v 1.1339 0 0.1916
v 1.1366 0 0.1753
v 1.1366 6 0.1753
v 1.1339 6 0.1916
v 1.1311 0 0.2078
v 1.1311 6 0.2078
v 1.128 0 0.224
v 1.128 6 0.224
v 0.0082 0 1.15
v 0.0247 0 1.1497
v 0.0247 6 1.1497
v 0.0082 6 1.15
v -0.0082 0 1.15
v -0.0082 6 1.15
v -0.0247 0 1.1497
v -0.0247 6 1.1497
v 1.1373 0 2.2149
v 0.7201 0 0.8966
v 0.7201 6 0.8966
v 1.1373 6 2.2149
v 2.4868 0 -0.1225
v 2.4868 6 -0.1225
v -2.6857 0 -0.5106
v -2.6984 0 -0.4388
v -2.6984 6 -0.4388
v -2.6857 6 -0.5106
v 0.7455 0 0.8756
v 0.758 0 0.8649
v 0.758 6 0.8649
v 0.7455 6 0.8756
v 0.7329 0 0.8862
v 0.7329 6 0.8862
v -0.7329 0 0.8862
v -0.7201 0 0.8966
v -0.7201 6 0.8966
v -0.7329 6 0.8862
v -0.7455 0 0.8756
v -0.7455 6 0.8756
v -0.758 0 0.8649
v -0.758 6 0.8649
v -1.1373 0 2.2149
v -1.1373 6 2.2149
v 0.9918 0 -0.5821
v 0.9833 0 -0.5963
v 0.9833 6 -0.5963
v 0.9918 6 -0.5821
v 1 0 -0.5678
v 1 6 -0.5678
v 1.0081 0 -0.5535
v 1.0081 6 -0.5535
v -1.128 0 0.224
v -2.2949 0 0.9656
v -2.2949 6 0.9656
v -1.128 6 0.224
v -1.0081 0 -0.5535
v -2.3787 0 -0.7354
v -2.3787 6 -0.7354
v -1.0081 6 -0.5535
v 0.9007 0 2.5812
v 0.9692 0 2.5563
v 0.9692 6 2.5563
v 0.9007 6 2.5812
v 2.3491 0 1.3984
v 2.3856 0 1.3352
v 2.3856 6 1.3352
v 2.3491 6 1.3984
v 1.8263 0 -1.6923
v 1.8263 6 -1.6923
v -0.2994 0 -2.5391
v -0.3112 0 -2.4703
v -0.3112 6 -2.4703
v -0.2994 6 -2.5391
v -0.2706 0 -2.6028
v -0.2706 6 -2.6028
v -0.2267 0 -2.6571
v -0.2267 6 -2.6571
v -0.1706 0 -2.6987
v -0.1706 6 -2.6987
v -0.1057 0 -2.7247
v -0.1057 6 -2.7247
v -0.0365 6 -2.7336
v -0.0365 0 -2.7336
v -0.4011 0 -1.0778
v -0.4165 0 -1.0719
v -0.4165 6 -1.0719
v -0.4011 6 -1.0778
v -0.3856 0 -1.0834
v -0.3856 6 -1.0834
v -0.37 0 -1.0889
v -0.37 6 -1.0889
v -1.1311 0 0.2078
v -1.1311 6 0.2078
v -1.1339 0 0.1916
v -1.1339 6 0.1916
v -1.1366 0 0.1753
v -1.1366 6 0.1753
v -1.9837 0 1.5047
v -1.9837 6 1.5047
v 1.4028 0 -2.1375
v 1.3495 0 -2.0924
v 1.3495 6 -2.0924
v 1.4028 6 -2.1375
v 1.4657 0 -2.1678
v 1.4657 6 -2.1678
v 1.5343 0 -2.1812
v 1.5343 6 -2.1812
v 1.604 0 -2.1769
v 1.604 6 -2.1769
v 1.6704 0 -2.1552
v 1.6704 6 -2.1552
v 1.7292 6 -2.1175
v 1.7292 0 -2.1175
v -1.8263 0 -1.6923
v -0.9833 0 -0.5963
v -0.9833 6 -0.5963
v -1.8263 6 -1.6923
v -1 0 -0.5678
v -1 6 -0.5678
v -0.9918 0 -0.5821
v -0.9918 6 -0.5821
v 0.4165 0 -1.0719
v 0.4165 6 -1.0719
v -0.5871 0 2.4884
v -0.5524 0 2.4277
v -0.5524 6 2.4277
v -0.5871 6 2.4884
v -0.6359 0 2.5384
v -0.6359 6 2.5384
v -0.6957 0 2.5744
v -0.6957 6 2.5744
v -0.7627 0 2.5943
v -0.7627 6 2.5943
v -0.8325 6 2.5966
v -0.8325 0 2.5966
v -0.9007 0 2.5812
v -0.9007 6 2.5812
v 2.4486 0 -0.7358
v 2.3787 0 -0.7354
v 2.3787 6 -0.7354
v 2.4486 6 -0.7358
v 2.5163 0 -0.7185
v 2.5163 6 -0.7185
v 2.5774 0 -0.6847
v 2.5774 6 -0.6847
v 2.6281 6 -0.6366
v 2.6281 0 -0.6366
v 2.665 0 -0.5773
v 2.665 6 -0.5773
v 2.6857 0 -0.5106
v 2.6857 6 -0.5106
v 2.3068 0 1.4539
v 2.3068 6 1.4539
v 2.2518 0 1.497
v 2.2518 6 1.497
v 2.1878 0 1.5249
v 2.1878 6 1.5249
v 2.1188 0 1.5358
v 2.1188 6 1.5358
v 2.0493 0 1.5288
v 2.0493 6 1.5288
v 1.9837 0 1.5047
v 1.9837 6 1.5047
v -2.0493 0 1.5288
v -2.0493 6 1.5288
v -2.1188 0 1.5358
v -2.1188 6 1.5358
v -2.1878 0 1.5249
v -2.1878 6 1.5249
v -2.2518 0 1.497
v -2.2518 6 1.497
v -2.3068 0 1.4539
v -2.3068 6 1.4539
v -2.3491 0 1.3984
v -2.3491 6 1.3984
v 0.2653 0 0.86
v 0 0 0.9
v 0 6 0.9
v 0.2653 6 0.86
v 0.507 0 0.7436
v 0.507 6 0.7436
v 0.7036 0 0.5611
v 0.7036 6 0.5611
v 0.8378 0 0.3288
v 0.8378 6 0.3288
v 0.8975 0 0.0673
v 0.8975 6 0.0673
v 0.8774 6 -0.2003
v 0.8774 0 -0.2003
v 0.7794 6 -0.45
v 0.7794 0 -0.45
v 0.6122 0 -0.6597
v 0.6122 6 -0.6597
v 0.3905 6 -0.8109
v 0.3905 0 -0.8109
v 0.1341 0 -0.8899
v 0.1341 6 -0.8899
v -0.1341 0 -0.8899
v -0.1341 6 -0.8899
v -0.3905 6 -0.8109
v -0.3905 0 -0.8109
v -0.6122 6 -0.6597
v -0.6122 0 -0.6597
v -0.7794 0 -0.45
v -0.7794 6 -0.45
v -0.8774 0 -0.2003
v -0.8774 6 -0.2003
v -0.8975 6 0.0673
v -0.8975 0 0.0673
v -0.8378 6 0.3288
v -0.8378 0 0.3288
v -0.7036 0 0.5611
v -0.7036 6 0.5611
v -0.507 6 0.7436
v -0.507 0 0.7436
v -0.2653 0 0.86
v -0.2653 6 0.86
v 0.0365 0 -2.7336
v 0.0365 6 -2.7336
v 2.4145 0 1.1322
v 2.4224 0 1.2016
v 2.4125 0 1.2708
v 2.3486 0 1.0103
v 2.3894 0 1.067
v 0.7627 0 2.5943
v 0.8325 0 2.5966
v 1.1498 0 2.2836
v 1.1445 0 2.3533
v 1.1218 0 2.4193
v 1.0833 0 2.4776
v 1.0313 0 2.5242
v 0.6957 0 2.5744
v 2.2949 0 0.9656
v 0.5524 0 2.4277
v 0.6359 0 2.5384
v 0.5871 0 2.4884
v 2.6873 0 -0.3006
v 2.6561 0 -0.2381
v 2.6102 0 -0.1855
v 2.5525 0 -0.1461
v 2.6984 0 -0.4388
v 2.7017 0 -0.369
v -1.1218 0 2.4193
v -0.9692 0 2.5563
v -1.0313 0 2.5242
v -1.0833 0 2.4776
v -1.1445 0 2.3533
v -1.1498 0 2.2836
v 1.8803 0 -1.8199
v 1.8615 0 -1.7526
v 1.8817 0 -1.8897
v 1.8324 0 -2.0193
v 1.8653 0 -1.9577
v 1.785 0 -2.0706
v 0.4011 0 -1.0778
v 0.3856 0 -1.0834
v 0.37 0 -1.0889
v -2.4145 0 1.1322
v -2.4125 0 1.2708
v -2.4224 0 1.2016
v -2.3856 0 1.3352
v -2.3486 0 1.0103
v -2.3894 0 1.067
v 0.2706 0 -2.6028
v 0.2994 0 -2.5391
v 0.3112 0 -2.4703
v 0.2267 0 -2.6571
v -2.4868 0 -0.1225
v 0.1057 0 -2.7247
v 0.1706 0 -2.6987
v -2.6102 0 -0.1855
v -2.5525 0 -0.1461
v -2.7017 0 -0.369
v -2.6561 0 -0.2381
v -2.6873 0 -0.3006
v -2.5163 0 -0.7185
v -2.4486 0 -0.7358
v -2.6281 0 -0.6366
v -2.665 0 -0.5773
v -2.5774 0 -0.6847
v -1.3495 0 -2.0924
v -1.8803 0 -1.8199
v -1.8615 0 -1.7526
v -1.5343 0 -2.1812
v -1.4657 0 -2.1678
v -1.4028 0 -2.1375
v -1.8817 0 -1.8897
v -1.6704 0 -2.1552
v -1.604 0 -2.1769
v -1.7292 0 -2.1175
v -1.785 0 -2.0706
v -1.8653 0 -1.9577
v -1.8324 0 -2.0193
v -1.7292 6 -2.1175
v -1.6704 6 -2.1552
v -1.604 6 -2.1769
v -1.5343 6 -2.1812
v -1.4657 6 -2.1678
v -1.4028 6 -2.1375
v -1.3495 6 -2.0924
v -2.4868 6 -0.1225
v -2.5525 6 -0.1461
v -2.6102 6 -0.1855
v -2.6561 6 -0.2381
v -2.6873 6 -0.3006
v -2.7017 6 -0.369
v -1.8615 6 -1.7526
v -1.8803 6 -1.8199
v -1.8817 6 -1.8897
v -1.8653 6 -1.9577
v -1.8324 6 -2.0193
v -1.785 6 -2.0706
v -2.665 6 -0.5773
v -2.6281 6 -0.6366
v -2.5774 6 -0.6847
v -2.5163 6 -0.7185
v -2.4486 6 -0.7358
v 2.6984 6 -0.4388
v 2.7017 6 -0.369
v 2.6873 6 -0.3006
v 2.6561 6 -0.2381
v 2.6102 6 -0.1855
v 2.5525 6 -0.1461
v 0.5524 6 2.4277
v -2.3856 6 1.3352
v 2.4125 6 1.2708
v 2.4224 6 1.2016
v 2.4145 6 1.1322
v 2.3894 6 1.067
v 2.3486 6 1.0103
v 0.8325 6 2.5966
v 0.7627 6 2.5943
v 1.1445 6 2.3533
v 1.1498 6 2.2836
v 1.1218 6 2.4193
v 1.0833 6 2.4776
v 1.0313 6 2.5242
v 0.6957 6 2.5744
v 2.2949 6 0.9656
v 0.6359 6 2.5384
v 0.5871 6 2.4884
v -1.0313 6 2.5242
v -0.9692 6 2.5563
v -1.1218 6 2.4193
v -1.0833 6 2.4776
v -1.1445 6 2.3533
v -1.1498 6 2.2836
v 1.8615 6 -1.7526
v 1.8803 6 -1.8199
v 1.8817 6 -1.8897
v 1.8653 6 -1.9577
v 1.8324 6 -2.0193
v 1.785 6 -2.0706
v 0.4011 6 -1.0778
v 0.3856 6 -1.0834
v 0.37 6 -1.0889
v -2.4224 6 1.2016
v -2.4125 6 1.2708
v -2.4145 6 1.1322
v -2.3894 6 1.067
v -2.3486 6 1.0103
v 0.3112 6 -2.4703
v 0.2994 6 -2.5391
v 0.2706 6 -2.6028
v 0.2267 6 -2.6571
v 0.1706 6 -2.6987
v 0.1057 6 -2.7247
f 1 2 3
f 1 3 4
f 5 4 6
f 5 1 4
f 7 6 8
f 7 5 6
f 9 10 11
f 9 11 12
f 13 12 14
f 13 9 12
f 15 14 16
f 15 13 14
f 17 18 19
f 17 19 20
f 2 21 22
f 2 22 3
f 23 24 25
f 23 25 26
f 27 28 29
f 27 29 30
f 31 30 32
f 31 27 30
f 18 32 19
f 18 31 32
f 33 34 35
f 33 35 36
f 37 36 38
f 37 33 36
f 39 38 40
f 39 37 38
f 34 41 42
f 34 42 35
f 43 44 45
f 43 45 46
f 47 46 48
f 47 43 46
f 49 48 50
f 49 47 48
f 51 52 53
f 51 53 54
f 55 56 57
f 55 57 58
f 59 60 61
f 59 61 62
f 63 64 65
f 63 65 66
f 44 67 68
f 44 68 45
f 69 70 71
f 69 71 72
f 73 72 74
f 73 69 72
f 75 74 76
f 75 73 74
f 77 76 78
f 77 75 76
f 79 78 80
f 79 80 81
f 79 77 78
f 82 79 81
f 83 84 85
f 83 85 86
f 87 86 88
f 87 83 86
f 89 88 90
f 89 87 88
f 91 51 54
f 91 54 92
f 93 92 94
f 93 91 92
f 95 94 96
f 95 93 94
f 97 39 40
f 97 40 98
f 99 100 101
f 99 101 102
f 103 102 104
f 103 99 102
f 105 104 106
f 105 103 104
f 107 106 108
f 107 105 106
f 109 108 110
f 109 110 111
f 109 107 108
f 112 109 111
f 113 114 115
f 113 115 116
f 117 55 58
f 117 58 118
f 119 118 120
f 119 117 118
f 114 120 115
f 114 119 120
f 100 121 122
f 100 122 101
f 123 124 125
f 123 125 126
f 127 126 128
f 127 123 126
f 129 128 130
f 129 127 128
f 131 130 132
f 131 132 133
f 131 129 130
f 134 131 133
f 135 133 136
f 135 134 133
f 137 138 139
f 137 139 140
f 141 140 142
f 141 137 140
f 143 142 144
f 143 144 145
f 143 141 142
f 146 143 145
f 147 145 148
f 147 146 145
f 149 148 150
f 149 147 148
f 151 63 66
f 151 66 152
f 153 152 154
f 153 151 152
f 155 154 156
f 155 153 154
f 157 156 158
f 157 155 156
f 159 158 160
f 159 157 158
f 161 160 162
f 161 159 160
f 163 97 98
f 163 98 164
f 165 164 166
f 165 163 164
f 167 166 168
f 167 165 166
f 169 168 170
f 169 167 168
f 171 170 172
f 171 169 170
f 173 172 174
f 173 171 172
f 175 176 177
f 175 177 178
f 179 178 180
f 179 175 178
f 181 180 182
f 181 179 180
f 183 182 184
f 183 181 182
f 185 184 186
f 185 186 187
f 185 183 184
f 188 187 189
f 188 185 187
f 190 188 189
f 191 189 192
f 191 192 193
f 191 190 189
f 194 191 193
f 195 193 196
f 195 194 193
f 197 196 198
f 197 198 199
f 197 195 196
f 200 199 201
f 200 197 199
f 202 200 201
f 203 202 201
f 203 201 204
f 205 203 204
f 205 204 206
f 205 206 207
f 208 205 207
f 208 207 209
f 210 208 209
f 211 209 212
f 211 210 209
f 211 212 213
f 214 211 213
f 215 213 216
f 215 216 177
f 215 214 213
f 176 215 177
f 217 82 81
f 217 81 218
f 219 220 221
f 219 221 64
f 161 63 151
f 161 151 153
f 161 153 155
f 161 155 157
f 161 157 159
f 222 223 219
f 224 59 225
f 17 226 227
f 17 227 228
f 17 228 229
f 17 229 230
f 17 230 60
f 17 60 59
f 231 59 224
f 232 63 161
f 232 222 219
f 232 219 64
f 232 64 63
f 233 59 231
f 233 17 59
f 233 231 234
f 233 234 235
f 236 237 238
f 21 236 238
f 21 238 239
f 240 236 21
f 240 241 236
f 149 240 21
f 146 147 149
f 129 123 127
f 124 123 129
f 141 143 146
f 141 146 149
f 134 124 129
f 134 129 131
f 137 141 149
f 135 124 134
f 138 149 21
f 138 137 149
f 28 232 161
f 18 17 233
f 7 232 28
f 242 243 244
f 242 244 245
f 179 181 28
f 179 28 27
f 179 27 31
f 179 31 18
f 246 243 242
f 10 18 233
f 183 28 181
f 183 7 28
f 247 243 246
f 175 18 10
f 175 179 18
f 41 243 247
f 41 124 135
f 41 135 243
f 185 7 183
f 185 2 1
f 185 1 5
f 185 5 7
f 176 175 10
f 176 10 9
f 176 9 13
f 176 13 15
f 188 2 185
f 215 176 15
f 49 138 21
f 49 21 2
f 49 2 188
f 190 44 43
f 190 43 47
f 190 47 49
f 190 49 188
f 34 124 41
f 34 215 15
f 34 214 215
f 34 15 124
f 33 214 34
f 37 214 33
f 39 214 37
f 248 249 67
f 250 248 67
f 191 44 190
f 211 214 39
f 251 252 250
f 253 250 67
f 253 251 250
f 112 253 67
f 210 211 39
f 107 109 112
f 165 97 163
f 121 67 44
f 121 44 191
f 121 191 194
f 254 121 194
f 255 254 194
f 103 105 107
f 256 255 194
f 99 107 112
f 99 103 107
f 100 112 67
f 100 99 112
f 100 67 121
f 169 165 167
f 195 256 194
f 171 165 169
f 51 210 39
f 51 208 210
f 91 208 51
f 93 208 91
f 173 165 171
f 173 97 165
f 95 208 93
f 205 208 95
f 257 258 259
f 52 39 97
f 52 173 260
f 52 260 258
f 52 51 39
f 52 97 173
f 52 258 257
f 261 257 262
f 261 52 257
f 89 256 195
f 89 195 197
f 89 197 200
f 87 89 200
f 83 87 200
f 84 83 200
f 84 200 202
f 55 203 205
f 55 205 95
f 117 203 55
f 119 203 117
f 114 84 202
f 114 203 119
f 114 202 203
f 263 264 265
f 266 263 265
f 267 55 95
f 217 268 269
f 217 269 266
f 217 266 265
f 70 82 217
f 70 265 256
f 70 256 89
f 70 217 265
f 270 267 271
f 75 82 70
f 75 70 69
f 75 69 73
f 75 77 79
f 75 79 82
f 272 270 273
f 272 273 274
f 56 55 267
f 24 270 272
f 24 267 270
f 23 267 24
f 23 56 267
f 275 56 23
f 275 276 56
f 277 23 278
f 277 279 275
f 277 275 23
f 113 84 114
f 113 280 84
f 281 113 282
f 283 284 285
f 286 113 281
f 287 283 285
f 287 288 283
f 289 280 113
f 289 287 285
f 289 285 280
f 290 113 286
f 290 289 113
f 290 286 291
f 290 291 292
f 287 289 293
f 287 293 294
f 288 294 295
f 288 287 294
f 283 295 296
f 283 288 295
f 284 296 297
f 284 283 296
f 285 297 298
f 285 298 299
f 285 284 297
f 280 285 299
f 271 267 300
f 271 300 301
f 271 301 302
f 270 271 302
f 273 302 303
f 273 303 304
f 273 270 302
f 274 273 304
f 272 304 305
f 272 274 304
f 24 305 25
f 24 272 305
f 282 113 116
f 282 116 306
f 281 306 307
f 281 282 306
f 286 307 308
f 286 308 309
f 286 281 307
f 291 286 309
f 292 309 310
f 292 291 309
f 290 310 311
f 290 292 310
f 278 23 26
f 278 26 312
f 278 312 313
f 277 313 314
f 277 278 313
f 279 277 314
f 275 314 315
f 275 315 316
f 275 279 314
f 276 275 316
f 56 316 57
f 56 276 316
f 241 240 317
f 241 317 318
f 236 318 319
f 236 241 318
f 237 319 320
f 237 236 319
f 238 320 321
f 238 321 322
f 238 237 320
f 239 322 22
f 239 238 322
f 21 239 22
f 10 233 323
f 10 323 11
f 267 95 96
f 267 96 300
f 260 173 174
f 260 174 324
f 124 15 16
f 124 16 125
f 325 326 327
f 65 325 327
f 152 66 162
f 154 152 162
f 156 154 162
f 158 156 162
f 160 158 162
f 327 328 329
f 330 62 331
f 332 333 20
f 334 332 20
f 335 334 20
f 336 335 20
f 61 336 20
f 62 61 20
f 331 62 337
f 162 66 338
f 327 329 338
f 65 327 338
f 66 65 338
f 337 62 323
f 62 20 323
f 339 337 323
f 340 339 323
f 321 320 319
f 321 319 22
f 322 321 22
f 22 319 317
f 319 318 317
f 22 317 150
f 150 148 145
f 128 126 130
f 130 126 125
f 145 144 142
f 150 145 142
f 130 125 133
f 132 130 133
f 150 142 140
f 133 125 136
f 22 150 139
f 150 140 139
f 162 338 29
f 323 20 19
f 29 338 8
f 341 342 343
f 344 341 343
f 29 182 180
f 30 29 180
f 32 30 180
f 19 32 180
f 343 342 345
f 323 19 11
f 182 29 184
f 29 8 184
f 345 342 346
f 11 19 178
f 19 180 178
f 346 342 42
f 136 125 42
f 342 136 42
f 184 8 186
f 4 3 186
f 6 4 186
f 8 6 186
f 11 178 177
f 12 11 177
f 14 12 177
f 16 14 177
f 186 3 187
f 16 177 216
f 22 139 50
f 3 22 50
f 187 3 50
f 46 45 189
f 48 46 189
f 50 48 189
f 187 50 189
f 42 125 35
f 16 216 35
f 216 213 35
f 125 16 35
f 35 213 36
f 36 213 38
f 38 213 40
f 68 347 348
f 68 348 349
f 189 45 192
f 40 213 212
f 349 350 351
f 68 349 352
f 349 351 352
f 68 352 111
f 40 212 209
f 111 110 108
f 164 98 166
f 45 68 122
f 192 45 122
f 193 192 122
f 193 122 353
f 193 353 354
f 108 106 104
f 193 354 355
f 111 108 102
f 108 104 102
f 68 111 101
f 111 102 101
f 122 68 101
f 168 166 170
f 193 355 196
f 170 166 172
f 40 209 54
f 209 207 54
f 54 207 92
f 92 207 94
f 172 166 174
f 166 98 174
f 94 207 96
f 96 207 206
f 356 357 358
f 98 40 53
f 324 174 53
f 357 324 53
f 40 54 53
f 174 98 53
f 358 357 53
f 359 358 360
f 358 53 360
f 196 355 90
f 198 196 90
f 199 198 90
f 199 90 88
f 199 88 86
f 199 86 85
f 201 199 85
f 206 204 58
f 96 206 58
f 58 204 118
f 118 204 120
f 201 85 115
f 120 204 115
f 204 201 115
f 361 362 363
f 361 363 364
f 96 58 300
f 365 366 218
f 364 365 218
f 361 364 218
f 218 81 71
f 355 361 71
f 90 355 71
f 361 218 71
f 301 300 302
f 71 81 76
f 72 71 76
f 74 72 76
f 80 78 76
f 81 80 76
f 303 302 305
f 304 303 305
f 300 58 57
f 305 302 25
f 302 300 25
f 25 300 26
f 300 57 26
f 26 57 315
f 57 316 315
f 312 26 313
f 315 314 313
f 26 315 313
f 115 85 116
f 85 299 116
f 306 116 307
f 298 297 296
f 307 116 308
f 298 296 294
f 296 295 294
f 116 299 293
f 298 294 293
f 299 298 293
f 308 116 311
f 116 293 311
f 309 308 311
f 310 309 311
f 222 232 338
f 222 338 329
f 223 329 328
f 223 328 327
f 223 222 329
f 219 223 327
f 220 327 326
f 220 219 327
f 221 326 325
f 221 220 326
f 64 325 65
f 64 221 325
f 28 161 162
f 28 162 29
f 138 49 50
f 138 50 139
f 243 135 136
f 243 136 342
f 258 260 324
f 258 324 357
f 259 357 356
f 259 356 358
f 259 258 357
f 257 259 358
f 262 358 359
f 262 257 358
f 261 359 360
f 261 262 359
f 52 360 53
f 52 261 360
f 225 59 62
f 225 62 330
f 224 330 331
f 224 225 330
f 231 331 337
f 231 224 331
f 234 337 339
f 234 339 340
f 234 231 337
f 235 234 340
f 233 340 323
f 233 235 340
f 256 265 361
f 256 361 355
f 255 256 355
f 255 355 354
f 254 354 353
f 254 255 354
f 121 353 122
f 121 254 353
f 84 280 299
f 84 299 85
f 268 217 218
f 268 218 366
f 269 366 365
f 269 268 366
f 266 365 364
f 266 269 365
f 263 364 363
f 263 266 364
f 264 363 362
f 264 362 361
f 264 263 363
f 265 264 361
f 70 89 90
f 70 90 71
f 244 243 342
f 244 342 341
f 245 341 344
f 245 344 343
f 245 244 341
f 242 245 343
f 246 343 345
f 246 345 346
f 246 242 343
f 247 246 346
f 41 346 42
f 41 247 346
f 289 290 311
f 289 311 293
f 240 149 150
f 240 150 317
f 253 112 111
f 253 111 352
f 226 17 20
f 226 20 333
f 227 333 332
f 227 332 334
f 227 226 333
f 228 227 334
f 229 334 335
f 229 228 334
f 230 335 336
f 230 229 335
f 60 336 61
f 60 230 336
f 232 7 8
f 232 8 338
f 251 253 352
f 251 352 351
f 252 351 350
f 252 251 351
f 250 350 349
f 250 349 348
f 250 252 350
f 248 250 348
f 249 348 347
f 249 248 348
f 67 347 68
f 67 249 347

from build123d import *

# Parameters (mm, degrees)
ESBO_O1_R                = 0.9
RESSALTO_EXTRUS_O1_DEPTH = 6


with BuildPart() as part:
    # Esboço1 → Ressalto-extrusão1 (new body)
    with BuildSketch(Plane(origin=(0, 0, 0), x_dir=(1, 0, 0), z_dir=(0, 1, 0))):
        with BuildLine():
            Line((0.036455066, 2.733587387), (-0.036455066, 2.733587387))
            ThreePointArc((-0.036455066, 2.733587387), (-0.22673027, 2.657132964), (-0.311206342, 2.470280816))
            Line((-0.311206342, 2.470280816), (-0.37, 1.088852607))
            ThreePointArc((-0.37, 1.088852607), (-0.393323165, 1.080646514), (-0.416464521, 1.071940905))
            Line((-0.416464521, 1.071940905), (-1.349468012, 2.092384472))
            ThreePointArc((-1.349468012, 2.092384472), (-1.534286683, 2.181221351), (-1.729189902, 2.117482292))
            Line((-1.729189902, 2.117482292), (-1.785042303, 2.070616563))
            ThreePointArc((-1.785042303, 2.070616563), (-1.88165761, 1.889742534), (-1.826263789, 1.692305311))
            Line((-1.826263789, 1.692305311), (-0.983337409, 0.596278073))
            ThreePointArc((-0.983337409, 0.596278073), (-0.995929214, 0.575), (-1.008060664, 0.55345614))
            Line((-1.008060664, 0.55345614), (-2.378711285, 0.73543818))
            ThreePointArc((-2.378711285, 0.73543818), (-2.577393846, 0.684692025), (-2.685727696, 0.510583699))
            Line((-2.685727696, 0.510583699), (-2.698388408, 0.438781237))
            ThreePointArc((-2.698388408, 0.438781237), (-2.656136442, 0.238120569), (-2.486792113, 0.122481344))
            Line((-2.486792113, 0.122481344), (-1.136560315, -0.175301598))
            ThreePointArc((-1.136560315, -0.175301598), (-1.132528916, -0.199695404), (-1.127974019, -0.223996904))
            Line((-1.127974019, -0.223996904), (-2.294929112, -0.96562781))
            ThreePointArc((-2.294929112, -0.96562781), (-2.414509784, -1.132212308), (-2.385583653, -1.33522268))
            Line((-2.385583653, -1.33522268), (-2.349128587, -1.398364706))
            ThreePointArc((-2.349128587, -1.398364706), (-2.187779513, -1.524920656), (-1.98372277, -1.504653006))
            Line((-1.98372277, -1.504653006), (-0.757974019, -0.864855703))
            ThreePointArc((-0.757974019, -0.864855703), (-0.739205751, -0.88095111), (-0.720095794, -0.896639307))
            Line((-0.720095794, -0.896639307), (-1.137324101, -2.214865816))
            ThreePointArc((-1.137324101, -2.214865816), (-1.121849759, -2.41934192), (-0.969198506, -2.556263529))
            Line((-0.969198506, -2.556263529), (-0.900685394, -2.581200262))
            ThreePointArc((-0.900685394, -2.581200262), (-0.695736235, -2.574434559), (-0.552447496, -2.427743491))
            Line((-0.552447496, -2.427743491), (-0.024723255, -1.149734213))
            ThreePointArc((-0.024723255, -1.149734213), (0, -1.15), (0.024723255, -1.149734213))
            Line((0.024723255, -1.149734213), (0.552447496, -2.427743491))
            ThreePointArc((0.552447496, -2.427743491), (0.695736235, -2.574434559), (0.900685394, -2.581200262))
            Line((0.900685394, -2.581200262), (0.969198506, -2.556263529))
            ThreePointArc((0.969198506, -2.556263529), (1.121849759, -2.41934192), (1.137324101, -2.214865816))
            Line((1.137324101, -2.214865816), (0.720095794, -0.896639307))
            ThreePointArc((0.720095794, -0.896639307), (0.739205751, -0.88095111), (0.757974019, -0.864855703))
            Line((0.757974019, -0.864855703), (1.98372277, -1.504653006))
            ThreePointArc((1.98372277, -1.504653006), (2.187779513, -1.524920656), (2.349128587, -1.398364706))
            Line((2.349128587, -1.398364706), (2.385583653, -1.33522268))
            ThreePointArc((2.385583653, -1.33522268), (2.414509784, -1.132212308), (2.294929112, -0.96562781))
            Line((2.294929112, -0.96562781), (1.127974019, -0.223996904))
            ThreePointArc((1.127974019, -0.223996904), (1.132528916, -0.199695404), (1.136560315, -0.175301598))
            Line((1.136560315, -0.175301598), (2.486792113, 0.122481344))
            ThreePointArc((2.486792113, 0.122481344), (2.656136442, 0.238120569), (2.698388408, 0.438781237))
            Line((2.698388408, 0.438781237), (2.685727696, 0.510583699))
            ThreePointArc((2.685727696, 0.510583699), (2.577393846, 0.684692025), (2.378711285, 0.73543818))
            Line((2.378711285, 0.73543818), (1.008060664, 0.55345614))
            ThreePointArc((1.008060664, 0.55345614), (0.995929214, 0.575), (0.983337409, 0.596278073))
            Line((0.983337409, 0.596278073), (1.826263789, 1.692305311))
            ThreePointArc((1.826263789, 1.692305311), (1.88165761, 1.889742534), (1.785042303, 2.070616563))
            Line((1.785042303, 2.070616563), (1.729189902, 2.117482292))
            ThreePointArc((1.729189902, 2.117482292), (1.534286683, 2.181221351), (1.349468012, 2.092384472))
            Line((1.349468012, 2.092384472), (0.416464521, 1.071940905))
            ThreePointArc((0.416464521, 1.071940905), (0.393323165, 1.080646514), (0.37, 1.088852607))
            Line((0.37, 1.088852607), (0.311206342, 2.470280816))
            ThreePointArc((0.311206342, 2.470280816), (0.22673027, 2.657132964), (0.036455066, 2.733587387))
        make_face()
        Circle(ESBO_O1_R, mode=Mode.SUBTRACT)
    extrude(amount=RESSALTO_EXTRUS_O1_DEPTH)


solid = part.part
